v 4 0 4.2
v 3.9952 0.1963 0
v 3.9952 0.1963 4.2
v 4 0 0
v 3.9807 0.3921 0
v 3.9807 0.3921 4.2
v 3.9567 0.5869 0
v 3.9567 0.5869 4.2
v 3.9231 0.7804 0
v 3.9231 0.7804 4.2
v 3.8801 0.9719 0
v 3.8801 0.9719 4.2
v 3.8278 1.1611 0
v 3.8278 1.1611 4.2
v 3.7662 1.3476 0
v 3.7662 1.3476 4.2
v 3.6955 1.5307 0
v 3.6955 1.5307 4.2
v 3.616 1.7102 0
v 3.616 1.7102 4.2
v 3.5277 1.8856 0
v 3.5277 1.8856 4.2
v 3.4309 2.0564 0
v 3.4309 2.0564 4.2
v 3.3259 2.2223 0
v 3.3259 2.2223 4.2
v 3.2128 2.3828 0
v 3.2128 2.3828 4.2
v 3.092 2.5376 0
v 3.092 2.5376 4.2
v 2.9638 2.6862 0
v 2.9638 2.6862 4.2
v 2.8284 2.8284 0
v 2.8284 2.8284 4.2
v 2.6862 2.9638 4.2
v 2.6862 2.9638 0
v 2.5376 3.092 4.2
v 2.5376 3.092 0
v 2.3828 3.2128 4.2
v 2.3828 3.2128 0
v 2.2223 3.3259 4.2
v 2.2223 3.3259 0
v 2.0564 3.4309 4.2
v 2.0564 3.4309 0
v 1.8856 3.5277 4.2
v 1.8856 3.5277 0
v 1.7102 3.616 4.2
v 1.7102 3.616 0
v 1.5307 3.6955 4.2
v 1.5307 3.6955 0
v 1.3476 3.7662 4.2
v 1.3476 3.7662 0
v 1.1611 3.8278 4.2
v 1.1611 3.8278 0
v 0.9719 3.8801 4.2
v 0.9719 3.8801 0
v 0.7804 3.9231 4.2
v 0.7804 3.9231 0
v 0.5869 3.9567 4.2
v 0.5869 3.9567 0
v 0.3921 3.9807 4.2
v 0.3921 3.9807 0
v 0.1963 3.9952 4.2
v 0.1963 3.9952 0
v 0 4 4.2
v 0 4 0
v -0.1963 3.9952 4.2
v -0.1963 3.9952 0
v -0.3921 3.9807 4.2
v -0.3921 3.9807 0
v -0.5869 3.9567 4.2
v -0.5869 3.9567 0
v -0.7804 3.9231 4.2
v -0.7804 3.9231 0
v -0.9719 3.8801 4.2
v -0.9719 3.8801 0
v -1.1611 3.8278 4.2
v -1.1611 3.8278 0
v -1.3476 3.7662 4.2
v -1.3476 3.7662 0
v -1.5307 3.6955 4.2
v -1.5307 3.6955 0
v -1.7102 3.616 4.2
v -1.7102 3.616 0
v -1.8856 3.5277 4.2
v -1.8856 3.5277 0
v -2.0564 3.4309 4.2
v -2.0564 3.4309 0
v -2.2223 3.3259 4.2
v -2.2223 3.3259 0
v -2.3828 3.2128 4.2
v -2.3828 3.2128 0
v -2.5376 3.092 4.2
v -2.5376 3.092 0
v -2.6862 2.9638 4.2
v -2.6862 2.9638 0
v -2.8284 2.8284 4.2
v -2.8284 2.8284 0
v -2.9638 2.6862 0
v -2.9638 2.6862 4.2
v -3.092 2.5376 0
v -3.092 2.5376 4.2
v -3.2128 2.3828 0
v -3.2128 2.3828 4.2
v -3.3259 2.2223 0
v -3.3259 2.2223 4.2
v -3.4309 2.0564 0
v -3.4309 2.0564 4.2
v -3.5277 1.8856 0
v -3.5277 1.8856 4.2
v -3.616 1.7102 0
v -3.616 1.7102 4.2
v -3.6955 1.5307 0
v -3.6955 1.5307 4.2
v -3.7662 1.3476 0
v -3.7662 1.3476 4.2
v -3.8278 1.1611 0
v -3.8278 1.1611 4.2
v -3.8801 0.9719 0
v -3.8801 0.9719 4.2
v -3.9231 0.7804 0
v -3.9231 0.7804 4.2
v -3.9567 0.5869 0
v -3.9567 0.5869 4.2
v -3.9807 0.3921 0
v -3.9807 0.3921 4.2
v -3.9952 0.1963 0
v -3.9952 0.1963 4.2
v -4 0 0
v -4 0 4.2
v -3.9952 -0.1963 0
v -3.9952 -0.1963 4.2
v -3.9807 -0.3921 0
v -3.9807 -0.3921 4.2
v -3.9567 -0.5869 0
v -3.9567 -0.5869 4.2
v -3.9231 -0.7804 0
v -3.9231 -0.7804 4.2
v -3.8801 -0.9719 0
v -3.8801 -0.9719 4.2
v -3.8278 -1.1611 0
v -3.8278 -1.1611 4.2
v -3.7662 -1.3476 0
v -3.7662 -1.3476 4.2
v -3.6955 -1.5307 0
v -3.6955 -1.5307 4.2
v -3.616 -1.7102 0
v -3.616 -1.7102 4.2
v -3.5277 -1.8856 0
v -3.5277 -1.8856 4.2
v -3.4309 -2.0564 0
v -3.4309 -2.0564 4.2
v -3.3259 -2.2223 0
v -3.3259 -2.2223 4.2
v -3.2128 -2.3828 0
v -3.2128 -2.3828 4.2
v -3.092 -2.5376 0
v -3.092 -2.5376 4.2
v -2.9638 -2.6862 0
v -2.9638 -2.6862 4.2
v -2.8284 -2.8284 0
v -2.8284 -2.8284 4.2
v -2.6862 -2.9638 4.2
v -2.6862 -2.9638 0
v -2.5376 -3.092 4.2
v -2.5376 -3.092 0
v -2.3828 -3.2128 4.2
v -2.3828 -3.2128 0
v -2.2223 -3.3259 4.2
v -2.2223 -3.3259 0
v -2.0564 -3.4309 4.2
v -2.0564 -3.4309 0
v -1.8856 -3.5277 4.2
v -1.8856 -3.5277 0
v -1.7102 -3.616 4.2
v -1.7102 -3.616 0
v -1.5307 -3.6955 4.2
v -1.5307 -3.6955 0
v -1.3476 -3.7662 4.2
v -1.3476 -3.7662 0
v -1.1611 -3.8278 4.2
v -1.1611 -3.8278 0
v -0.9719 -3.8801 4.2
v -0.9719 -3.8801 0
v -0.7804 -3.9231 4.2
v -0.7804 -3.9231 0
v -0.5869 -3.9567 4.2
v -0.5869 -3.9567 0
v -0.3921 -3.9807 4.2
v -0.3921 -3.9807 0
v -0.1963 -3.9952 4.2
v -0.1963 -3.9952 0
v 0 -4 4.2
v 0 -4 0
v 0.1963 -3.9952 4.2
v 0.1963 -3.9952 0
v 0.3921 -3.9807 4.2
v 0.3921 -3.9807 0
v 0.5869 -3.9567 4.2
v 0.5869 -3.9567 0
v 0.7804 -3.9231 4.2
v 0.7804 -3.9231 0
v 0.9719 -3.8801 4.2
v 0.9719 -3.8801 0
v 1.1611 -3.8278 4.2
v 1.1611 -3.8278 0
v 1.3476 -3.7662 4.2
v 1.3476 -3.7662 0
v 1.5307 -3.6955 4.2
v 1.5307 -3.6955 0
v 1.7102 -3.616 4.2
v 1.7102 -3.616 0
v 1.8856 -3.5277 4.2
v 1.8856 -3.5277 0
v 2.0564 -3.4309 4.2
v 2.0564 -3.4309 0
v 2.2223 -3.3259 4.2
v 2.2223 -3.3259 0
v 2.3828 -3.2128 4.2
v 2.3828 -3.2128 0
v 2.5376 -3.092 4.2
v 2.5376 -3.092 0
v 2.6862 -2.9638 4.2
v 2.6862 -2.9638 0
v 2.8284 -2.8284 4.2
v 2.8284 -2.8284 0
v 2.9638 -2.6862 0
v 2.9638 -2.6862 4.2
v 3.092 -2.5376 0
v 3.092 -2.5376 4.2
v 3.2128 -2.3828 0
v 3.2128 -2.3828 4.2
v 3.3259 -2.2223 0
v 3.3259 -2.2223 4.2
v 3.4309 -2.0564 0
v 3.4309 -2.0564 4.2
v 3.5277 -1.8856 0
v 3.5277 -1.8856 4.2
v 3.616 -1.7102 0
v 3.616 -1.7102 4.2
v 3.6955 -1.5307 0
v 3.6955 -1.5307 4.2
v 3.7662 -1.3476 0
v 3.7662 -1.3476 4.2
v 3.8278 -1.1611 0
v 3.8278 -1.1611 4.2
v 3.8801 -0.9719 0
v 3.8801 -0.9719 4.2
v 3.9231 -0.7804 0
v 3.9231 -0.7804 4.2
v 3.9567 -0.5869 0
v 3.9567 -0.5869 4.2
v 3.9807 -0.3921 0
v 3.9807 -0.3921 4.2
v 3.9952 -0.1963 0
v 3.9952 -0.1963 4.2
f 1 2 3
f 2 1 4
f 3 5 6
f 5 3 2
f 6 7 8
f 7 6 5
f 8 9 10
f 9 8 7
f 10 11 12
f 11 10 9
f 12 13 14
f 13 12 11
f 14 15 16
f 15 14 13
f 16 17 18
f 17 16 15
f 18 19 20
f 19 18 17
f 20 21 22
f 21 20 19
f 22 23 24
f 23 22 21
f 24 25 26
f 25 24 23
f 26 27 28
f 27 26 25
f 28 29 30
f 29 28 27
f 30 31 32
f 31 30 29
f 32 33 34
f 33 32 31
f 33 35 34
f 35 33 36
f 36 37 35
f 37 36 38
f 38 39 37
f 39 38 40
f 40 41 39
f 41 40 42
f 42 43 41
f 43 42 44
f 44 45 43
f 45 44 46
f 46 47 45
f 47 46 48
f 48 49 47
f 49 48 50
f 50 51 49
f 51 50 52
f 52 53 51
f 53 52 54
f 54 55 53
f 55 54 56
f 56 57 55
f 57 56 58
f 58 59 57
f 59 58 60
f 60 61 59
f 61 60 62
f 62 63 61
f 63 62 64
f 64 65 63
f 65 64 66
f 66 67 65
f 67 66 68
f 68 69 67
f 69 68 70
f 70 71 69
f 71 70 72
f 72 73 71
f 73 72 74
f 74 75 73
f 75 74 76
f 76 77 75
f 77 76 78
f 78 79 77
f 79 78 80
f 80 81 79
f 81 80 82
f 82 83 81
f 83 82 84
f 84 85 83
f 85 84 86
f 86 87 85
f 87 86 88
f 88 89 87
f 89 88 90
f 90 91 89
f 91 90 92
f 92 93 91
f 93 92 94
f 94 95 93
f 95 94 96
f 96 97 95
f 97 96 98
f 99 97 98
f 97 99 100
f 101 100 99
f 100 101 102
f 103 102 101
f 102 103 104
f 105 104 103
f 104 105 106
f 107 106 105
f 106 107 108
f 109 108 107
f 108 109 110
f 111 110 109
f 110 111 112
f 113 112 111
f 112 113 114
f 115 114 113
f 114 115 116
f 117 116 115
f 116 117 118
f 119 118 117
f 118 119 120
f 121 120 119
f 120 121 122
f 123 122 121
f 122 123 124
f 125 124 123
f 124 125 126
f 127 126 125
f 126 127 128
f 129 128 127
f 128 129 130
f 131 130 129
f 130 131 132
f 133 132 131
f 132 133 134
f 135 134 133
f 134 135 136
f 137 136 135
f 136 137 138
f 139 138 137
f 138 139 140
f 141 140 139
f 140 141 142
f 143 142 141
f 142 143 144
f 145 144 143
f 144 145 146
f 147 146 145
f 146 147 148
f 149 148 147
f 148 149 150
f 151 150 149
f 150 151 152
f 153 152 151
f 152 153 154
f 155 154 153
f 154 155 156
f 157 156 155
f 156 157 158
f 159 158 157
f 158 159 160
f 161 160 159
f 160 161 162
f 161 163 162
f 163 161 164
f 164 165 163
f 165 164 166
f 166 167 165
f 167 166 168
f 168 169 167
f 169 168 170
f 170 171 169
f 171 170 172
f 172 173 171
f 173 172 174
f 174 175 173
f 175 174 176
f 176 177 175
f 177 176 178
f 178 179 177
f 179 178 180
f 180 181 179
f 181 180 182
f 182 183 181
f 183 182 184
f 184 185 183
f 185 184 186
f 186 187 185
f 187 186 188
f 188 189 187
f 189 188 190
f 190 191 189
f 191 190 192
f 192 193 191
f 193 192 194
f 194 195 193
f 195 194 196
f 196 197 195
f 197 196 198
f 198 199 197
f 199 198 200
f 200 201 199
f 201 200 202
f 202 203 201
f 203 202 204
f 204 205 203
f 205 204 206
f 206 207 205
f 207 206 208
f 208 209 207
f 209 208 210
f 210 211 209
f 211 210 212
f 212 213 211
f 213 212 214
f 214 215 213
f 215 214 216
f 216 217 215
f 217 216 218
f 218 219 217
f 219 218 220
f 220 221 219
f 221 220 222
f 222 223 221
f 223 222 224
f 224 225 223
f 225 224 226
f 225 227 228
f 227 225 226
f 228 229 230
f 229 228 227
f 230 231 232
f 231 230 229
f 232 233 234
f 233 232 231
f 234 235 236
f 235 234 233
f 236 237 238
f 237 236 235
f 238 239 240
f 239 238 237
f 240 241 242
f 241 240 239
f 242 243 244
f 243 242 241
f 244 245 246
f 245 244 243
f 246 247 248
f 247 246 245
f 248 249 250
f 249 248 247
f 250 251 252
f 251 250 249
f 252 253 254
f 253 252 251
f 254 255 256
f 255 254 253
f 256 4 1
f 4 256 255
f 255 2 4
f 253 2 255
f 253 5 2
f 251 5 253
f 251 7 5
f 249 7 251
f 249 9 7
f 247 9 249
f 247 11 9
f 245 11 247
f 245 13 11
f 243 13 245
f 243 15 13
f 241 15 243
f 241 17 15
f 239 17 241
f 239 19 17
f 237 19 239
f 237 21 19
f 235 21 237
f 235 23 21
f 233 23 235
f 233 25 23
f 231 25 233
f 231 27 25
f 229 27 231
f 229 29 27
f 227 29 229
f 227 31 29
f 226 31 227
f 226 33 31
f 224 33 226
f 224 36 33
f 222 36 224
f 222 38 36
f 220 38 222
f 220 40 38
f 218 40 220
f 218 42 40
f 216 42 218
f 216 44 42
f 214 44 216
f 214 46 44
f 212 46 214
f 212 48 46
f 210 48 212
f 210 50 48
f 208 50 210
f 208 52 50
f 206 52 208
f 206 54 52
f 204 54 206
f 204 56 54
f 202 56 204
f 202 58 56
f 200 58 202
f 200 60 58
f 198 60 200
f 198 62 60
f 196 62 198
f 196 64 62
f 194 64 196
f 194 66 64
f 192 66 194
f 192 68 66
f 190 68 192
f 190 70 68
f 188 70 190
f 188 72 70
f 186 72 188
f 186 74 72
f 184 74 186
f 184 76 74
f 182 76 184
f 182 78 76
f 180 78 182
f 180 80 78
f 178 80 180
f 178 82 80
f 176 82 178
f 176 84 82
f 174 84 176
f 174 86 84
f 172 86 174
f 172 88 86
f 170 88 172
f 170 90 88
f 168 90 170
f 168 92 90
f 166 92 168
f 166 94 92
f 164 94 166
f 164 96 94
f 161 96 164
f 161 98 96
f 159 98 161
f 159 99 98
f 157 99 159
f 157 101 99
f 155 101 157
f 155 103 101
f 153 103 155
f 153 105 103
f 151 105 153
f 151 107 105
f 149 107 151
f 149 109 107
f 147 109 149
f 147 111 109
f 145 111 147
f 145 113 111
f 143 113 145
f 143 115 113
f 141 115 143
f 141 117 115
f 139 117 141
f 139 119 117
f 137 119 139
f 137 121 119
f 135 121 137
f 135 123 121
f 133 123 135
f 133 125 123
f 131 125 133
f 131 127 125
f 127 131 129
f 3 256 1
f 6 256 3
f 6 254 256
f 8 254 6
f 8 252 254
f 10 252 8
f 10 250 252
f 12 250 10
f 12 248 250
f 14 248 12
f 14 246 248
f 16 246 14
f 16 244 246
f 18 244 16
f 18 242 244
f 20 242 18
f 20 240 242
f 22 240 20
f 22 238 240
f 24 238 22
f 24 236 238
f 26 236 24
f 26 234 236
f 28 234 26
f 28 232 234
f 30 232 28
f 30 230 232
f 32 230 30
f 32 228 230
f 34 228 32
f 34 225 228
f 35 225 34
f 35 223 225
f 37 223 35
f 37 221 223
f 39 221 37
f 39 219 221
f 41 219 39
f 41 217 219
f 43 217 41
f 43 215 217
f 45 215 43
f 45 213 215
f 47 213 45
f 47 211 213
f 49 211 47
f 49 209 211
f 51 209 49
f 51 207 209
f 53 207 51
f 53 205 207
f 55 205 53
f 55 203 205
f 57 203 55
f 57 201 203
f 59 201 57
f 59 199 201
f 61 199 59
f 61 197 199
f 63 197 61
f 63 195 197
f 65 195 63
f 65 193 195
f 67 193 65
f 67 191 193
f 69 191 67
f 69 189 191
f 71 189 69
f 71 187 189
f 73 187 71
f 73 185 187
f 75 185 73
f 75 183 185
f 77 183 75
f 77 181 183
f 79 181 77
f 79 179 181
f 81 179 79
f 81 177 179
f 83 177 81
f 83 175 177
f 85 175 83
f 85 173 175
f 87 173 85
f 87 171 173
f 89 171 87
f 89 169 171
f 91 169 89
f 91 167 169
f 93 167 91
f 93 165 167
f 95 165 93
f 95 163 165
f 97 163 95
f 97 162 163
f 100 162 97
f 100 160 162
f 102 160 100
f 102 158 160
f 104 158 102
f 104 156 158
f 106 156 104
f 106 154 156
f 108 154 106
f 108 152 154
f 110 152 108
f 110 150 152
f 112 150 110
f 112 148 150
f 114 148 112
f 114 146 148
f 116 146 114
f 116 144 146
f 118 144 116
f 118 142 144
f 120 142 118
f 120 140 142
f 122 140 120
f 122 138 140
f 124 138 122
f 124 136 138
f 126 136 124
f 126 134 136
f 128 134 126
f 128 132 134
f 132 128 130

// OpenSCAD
// Permanent magnet: 8.0mm diameter, 4.2mm tall

magnet_diameter = 8.0; // mm
magnet_height   = 4.2; // mm

$fn = 128;

module magnet(d=magnet_diameter, h=magnet_height) {
    // Single connected solid with exact requested dimensions
    cylinder(d=d, h=h, center=false);
}

magnet();
